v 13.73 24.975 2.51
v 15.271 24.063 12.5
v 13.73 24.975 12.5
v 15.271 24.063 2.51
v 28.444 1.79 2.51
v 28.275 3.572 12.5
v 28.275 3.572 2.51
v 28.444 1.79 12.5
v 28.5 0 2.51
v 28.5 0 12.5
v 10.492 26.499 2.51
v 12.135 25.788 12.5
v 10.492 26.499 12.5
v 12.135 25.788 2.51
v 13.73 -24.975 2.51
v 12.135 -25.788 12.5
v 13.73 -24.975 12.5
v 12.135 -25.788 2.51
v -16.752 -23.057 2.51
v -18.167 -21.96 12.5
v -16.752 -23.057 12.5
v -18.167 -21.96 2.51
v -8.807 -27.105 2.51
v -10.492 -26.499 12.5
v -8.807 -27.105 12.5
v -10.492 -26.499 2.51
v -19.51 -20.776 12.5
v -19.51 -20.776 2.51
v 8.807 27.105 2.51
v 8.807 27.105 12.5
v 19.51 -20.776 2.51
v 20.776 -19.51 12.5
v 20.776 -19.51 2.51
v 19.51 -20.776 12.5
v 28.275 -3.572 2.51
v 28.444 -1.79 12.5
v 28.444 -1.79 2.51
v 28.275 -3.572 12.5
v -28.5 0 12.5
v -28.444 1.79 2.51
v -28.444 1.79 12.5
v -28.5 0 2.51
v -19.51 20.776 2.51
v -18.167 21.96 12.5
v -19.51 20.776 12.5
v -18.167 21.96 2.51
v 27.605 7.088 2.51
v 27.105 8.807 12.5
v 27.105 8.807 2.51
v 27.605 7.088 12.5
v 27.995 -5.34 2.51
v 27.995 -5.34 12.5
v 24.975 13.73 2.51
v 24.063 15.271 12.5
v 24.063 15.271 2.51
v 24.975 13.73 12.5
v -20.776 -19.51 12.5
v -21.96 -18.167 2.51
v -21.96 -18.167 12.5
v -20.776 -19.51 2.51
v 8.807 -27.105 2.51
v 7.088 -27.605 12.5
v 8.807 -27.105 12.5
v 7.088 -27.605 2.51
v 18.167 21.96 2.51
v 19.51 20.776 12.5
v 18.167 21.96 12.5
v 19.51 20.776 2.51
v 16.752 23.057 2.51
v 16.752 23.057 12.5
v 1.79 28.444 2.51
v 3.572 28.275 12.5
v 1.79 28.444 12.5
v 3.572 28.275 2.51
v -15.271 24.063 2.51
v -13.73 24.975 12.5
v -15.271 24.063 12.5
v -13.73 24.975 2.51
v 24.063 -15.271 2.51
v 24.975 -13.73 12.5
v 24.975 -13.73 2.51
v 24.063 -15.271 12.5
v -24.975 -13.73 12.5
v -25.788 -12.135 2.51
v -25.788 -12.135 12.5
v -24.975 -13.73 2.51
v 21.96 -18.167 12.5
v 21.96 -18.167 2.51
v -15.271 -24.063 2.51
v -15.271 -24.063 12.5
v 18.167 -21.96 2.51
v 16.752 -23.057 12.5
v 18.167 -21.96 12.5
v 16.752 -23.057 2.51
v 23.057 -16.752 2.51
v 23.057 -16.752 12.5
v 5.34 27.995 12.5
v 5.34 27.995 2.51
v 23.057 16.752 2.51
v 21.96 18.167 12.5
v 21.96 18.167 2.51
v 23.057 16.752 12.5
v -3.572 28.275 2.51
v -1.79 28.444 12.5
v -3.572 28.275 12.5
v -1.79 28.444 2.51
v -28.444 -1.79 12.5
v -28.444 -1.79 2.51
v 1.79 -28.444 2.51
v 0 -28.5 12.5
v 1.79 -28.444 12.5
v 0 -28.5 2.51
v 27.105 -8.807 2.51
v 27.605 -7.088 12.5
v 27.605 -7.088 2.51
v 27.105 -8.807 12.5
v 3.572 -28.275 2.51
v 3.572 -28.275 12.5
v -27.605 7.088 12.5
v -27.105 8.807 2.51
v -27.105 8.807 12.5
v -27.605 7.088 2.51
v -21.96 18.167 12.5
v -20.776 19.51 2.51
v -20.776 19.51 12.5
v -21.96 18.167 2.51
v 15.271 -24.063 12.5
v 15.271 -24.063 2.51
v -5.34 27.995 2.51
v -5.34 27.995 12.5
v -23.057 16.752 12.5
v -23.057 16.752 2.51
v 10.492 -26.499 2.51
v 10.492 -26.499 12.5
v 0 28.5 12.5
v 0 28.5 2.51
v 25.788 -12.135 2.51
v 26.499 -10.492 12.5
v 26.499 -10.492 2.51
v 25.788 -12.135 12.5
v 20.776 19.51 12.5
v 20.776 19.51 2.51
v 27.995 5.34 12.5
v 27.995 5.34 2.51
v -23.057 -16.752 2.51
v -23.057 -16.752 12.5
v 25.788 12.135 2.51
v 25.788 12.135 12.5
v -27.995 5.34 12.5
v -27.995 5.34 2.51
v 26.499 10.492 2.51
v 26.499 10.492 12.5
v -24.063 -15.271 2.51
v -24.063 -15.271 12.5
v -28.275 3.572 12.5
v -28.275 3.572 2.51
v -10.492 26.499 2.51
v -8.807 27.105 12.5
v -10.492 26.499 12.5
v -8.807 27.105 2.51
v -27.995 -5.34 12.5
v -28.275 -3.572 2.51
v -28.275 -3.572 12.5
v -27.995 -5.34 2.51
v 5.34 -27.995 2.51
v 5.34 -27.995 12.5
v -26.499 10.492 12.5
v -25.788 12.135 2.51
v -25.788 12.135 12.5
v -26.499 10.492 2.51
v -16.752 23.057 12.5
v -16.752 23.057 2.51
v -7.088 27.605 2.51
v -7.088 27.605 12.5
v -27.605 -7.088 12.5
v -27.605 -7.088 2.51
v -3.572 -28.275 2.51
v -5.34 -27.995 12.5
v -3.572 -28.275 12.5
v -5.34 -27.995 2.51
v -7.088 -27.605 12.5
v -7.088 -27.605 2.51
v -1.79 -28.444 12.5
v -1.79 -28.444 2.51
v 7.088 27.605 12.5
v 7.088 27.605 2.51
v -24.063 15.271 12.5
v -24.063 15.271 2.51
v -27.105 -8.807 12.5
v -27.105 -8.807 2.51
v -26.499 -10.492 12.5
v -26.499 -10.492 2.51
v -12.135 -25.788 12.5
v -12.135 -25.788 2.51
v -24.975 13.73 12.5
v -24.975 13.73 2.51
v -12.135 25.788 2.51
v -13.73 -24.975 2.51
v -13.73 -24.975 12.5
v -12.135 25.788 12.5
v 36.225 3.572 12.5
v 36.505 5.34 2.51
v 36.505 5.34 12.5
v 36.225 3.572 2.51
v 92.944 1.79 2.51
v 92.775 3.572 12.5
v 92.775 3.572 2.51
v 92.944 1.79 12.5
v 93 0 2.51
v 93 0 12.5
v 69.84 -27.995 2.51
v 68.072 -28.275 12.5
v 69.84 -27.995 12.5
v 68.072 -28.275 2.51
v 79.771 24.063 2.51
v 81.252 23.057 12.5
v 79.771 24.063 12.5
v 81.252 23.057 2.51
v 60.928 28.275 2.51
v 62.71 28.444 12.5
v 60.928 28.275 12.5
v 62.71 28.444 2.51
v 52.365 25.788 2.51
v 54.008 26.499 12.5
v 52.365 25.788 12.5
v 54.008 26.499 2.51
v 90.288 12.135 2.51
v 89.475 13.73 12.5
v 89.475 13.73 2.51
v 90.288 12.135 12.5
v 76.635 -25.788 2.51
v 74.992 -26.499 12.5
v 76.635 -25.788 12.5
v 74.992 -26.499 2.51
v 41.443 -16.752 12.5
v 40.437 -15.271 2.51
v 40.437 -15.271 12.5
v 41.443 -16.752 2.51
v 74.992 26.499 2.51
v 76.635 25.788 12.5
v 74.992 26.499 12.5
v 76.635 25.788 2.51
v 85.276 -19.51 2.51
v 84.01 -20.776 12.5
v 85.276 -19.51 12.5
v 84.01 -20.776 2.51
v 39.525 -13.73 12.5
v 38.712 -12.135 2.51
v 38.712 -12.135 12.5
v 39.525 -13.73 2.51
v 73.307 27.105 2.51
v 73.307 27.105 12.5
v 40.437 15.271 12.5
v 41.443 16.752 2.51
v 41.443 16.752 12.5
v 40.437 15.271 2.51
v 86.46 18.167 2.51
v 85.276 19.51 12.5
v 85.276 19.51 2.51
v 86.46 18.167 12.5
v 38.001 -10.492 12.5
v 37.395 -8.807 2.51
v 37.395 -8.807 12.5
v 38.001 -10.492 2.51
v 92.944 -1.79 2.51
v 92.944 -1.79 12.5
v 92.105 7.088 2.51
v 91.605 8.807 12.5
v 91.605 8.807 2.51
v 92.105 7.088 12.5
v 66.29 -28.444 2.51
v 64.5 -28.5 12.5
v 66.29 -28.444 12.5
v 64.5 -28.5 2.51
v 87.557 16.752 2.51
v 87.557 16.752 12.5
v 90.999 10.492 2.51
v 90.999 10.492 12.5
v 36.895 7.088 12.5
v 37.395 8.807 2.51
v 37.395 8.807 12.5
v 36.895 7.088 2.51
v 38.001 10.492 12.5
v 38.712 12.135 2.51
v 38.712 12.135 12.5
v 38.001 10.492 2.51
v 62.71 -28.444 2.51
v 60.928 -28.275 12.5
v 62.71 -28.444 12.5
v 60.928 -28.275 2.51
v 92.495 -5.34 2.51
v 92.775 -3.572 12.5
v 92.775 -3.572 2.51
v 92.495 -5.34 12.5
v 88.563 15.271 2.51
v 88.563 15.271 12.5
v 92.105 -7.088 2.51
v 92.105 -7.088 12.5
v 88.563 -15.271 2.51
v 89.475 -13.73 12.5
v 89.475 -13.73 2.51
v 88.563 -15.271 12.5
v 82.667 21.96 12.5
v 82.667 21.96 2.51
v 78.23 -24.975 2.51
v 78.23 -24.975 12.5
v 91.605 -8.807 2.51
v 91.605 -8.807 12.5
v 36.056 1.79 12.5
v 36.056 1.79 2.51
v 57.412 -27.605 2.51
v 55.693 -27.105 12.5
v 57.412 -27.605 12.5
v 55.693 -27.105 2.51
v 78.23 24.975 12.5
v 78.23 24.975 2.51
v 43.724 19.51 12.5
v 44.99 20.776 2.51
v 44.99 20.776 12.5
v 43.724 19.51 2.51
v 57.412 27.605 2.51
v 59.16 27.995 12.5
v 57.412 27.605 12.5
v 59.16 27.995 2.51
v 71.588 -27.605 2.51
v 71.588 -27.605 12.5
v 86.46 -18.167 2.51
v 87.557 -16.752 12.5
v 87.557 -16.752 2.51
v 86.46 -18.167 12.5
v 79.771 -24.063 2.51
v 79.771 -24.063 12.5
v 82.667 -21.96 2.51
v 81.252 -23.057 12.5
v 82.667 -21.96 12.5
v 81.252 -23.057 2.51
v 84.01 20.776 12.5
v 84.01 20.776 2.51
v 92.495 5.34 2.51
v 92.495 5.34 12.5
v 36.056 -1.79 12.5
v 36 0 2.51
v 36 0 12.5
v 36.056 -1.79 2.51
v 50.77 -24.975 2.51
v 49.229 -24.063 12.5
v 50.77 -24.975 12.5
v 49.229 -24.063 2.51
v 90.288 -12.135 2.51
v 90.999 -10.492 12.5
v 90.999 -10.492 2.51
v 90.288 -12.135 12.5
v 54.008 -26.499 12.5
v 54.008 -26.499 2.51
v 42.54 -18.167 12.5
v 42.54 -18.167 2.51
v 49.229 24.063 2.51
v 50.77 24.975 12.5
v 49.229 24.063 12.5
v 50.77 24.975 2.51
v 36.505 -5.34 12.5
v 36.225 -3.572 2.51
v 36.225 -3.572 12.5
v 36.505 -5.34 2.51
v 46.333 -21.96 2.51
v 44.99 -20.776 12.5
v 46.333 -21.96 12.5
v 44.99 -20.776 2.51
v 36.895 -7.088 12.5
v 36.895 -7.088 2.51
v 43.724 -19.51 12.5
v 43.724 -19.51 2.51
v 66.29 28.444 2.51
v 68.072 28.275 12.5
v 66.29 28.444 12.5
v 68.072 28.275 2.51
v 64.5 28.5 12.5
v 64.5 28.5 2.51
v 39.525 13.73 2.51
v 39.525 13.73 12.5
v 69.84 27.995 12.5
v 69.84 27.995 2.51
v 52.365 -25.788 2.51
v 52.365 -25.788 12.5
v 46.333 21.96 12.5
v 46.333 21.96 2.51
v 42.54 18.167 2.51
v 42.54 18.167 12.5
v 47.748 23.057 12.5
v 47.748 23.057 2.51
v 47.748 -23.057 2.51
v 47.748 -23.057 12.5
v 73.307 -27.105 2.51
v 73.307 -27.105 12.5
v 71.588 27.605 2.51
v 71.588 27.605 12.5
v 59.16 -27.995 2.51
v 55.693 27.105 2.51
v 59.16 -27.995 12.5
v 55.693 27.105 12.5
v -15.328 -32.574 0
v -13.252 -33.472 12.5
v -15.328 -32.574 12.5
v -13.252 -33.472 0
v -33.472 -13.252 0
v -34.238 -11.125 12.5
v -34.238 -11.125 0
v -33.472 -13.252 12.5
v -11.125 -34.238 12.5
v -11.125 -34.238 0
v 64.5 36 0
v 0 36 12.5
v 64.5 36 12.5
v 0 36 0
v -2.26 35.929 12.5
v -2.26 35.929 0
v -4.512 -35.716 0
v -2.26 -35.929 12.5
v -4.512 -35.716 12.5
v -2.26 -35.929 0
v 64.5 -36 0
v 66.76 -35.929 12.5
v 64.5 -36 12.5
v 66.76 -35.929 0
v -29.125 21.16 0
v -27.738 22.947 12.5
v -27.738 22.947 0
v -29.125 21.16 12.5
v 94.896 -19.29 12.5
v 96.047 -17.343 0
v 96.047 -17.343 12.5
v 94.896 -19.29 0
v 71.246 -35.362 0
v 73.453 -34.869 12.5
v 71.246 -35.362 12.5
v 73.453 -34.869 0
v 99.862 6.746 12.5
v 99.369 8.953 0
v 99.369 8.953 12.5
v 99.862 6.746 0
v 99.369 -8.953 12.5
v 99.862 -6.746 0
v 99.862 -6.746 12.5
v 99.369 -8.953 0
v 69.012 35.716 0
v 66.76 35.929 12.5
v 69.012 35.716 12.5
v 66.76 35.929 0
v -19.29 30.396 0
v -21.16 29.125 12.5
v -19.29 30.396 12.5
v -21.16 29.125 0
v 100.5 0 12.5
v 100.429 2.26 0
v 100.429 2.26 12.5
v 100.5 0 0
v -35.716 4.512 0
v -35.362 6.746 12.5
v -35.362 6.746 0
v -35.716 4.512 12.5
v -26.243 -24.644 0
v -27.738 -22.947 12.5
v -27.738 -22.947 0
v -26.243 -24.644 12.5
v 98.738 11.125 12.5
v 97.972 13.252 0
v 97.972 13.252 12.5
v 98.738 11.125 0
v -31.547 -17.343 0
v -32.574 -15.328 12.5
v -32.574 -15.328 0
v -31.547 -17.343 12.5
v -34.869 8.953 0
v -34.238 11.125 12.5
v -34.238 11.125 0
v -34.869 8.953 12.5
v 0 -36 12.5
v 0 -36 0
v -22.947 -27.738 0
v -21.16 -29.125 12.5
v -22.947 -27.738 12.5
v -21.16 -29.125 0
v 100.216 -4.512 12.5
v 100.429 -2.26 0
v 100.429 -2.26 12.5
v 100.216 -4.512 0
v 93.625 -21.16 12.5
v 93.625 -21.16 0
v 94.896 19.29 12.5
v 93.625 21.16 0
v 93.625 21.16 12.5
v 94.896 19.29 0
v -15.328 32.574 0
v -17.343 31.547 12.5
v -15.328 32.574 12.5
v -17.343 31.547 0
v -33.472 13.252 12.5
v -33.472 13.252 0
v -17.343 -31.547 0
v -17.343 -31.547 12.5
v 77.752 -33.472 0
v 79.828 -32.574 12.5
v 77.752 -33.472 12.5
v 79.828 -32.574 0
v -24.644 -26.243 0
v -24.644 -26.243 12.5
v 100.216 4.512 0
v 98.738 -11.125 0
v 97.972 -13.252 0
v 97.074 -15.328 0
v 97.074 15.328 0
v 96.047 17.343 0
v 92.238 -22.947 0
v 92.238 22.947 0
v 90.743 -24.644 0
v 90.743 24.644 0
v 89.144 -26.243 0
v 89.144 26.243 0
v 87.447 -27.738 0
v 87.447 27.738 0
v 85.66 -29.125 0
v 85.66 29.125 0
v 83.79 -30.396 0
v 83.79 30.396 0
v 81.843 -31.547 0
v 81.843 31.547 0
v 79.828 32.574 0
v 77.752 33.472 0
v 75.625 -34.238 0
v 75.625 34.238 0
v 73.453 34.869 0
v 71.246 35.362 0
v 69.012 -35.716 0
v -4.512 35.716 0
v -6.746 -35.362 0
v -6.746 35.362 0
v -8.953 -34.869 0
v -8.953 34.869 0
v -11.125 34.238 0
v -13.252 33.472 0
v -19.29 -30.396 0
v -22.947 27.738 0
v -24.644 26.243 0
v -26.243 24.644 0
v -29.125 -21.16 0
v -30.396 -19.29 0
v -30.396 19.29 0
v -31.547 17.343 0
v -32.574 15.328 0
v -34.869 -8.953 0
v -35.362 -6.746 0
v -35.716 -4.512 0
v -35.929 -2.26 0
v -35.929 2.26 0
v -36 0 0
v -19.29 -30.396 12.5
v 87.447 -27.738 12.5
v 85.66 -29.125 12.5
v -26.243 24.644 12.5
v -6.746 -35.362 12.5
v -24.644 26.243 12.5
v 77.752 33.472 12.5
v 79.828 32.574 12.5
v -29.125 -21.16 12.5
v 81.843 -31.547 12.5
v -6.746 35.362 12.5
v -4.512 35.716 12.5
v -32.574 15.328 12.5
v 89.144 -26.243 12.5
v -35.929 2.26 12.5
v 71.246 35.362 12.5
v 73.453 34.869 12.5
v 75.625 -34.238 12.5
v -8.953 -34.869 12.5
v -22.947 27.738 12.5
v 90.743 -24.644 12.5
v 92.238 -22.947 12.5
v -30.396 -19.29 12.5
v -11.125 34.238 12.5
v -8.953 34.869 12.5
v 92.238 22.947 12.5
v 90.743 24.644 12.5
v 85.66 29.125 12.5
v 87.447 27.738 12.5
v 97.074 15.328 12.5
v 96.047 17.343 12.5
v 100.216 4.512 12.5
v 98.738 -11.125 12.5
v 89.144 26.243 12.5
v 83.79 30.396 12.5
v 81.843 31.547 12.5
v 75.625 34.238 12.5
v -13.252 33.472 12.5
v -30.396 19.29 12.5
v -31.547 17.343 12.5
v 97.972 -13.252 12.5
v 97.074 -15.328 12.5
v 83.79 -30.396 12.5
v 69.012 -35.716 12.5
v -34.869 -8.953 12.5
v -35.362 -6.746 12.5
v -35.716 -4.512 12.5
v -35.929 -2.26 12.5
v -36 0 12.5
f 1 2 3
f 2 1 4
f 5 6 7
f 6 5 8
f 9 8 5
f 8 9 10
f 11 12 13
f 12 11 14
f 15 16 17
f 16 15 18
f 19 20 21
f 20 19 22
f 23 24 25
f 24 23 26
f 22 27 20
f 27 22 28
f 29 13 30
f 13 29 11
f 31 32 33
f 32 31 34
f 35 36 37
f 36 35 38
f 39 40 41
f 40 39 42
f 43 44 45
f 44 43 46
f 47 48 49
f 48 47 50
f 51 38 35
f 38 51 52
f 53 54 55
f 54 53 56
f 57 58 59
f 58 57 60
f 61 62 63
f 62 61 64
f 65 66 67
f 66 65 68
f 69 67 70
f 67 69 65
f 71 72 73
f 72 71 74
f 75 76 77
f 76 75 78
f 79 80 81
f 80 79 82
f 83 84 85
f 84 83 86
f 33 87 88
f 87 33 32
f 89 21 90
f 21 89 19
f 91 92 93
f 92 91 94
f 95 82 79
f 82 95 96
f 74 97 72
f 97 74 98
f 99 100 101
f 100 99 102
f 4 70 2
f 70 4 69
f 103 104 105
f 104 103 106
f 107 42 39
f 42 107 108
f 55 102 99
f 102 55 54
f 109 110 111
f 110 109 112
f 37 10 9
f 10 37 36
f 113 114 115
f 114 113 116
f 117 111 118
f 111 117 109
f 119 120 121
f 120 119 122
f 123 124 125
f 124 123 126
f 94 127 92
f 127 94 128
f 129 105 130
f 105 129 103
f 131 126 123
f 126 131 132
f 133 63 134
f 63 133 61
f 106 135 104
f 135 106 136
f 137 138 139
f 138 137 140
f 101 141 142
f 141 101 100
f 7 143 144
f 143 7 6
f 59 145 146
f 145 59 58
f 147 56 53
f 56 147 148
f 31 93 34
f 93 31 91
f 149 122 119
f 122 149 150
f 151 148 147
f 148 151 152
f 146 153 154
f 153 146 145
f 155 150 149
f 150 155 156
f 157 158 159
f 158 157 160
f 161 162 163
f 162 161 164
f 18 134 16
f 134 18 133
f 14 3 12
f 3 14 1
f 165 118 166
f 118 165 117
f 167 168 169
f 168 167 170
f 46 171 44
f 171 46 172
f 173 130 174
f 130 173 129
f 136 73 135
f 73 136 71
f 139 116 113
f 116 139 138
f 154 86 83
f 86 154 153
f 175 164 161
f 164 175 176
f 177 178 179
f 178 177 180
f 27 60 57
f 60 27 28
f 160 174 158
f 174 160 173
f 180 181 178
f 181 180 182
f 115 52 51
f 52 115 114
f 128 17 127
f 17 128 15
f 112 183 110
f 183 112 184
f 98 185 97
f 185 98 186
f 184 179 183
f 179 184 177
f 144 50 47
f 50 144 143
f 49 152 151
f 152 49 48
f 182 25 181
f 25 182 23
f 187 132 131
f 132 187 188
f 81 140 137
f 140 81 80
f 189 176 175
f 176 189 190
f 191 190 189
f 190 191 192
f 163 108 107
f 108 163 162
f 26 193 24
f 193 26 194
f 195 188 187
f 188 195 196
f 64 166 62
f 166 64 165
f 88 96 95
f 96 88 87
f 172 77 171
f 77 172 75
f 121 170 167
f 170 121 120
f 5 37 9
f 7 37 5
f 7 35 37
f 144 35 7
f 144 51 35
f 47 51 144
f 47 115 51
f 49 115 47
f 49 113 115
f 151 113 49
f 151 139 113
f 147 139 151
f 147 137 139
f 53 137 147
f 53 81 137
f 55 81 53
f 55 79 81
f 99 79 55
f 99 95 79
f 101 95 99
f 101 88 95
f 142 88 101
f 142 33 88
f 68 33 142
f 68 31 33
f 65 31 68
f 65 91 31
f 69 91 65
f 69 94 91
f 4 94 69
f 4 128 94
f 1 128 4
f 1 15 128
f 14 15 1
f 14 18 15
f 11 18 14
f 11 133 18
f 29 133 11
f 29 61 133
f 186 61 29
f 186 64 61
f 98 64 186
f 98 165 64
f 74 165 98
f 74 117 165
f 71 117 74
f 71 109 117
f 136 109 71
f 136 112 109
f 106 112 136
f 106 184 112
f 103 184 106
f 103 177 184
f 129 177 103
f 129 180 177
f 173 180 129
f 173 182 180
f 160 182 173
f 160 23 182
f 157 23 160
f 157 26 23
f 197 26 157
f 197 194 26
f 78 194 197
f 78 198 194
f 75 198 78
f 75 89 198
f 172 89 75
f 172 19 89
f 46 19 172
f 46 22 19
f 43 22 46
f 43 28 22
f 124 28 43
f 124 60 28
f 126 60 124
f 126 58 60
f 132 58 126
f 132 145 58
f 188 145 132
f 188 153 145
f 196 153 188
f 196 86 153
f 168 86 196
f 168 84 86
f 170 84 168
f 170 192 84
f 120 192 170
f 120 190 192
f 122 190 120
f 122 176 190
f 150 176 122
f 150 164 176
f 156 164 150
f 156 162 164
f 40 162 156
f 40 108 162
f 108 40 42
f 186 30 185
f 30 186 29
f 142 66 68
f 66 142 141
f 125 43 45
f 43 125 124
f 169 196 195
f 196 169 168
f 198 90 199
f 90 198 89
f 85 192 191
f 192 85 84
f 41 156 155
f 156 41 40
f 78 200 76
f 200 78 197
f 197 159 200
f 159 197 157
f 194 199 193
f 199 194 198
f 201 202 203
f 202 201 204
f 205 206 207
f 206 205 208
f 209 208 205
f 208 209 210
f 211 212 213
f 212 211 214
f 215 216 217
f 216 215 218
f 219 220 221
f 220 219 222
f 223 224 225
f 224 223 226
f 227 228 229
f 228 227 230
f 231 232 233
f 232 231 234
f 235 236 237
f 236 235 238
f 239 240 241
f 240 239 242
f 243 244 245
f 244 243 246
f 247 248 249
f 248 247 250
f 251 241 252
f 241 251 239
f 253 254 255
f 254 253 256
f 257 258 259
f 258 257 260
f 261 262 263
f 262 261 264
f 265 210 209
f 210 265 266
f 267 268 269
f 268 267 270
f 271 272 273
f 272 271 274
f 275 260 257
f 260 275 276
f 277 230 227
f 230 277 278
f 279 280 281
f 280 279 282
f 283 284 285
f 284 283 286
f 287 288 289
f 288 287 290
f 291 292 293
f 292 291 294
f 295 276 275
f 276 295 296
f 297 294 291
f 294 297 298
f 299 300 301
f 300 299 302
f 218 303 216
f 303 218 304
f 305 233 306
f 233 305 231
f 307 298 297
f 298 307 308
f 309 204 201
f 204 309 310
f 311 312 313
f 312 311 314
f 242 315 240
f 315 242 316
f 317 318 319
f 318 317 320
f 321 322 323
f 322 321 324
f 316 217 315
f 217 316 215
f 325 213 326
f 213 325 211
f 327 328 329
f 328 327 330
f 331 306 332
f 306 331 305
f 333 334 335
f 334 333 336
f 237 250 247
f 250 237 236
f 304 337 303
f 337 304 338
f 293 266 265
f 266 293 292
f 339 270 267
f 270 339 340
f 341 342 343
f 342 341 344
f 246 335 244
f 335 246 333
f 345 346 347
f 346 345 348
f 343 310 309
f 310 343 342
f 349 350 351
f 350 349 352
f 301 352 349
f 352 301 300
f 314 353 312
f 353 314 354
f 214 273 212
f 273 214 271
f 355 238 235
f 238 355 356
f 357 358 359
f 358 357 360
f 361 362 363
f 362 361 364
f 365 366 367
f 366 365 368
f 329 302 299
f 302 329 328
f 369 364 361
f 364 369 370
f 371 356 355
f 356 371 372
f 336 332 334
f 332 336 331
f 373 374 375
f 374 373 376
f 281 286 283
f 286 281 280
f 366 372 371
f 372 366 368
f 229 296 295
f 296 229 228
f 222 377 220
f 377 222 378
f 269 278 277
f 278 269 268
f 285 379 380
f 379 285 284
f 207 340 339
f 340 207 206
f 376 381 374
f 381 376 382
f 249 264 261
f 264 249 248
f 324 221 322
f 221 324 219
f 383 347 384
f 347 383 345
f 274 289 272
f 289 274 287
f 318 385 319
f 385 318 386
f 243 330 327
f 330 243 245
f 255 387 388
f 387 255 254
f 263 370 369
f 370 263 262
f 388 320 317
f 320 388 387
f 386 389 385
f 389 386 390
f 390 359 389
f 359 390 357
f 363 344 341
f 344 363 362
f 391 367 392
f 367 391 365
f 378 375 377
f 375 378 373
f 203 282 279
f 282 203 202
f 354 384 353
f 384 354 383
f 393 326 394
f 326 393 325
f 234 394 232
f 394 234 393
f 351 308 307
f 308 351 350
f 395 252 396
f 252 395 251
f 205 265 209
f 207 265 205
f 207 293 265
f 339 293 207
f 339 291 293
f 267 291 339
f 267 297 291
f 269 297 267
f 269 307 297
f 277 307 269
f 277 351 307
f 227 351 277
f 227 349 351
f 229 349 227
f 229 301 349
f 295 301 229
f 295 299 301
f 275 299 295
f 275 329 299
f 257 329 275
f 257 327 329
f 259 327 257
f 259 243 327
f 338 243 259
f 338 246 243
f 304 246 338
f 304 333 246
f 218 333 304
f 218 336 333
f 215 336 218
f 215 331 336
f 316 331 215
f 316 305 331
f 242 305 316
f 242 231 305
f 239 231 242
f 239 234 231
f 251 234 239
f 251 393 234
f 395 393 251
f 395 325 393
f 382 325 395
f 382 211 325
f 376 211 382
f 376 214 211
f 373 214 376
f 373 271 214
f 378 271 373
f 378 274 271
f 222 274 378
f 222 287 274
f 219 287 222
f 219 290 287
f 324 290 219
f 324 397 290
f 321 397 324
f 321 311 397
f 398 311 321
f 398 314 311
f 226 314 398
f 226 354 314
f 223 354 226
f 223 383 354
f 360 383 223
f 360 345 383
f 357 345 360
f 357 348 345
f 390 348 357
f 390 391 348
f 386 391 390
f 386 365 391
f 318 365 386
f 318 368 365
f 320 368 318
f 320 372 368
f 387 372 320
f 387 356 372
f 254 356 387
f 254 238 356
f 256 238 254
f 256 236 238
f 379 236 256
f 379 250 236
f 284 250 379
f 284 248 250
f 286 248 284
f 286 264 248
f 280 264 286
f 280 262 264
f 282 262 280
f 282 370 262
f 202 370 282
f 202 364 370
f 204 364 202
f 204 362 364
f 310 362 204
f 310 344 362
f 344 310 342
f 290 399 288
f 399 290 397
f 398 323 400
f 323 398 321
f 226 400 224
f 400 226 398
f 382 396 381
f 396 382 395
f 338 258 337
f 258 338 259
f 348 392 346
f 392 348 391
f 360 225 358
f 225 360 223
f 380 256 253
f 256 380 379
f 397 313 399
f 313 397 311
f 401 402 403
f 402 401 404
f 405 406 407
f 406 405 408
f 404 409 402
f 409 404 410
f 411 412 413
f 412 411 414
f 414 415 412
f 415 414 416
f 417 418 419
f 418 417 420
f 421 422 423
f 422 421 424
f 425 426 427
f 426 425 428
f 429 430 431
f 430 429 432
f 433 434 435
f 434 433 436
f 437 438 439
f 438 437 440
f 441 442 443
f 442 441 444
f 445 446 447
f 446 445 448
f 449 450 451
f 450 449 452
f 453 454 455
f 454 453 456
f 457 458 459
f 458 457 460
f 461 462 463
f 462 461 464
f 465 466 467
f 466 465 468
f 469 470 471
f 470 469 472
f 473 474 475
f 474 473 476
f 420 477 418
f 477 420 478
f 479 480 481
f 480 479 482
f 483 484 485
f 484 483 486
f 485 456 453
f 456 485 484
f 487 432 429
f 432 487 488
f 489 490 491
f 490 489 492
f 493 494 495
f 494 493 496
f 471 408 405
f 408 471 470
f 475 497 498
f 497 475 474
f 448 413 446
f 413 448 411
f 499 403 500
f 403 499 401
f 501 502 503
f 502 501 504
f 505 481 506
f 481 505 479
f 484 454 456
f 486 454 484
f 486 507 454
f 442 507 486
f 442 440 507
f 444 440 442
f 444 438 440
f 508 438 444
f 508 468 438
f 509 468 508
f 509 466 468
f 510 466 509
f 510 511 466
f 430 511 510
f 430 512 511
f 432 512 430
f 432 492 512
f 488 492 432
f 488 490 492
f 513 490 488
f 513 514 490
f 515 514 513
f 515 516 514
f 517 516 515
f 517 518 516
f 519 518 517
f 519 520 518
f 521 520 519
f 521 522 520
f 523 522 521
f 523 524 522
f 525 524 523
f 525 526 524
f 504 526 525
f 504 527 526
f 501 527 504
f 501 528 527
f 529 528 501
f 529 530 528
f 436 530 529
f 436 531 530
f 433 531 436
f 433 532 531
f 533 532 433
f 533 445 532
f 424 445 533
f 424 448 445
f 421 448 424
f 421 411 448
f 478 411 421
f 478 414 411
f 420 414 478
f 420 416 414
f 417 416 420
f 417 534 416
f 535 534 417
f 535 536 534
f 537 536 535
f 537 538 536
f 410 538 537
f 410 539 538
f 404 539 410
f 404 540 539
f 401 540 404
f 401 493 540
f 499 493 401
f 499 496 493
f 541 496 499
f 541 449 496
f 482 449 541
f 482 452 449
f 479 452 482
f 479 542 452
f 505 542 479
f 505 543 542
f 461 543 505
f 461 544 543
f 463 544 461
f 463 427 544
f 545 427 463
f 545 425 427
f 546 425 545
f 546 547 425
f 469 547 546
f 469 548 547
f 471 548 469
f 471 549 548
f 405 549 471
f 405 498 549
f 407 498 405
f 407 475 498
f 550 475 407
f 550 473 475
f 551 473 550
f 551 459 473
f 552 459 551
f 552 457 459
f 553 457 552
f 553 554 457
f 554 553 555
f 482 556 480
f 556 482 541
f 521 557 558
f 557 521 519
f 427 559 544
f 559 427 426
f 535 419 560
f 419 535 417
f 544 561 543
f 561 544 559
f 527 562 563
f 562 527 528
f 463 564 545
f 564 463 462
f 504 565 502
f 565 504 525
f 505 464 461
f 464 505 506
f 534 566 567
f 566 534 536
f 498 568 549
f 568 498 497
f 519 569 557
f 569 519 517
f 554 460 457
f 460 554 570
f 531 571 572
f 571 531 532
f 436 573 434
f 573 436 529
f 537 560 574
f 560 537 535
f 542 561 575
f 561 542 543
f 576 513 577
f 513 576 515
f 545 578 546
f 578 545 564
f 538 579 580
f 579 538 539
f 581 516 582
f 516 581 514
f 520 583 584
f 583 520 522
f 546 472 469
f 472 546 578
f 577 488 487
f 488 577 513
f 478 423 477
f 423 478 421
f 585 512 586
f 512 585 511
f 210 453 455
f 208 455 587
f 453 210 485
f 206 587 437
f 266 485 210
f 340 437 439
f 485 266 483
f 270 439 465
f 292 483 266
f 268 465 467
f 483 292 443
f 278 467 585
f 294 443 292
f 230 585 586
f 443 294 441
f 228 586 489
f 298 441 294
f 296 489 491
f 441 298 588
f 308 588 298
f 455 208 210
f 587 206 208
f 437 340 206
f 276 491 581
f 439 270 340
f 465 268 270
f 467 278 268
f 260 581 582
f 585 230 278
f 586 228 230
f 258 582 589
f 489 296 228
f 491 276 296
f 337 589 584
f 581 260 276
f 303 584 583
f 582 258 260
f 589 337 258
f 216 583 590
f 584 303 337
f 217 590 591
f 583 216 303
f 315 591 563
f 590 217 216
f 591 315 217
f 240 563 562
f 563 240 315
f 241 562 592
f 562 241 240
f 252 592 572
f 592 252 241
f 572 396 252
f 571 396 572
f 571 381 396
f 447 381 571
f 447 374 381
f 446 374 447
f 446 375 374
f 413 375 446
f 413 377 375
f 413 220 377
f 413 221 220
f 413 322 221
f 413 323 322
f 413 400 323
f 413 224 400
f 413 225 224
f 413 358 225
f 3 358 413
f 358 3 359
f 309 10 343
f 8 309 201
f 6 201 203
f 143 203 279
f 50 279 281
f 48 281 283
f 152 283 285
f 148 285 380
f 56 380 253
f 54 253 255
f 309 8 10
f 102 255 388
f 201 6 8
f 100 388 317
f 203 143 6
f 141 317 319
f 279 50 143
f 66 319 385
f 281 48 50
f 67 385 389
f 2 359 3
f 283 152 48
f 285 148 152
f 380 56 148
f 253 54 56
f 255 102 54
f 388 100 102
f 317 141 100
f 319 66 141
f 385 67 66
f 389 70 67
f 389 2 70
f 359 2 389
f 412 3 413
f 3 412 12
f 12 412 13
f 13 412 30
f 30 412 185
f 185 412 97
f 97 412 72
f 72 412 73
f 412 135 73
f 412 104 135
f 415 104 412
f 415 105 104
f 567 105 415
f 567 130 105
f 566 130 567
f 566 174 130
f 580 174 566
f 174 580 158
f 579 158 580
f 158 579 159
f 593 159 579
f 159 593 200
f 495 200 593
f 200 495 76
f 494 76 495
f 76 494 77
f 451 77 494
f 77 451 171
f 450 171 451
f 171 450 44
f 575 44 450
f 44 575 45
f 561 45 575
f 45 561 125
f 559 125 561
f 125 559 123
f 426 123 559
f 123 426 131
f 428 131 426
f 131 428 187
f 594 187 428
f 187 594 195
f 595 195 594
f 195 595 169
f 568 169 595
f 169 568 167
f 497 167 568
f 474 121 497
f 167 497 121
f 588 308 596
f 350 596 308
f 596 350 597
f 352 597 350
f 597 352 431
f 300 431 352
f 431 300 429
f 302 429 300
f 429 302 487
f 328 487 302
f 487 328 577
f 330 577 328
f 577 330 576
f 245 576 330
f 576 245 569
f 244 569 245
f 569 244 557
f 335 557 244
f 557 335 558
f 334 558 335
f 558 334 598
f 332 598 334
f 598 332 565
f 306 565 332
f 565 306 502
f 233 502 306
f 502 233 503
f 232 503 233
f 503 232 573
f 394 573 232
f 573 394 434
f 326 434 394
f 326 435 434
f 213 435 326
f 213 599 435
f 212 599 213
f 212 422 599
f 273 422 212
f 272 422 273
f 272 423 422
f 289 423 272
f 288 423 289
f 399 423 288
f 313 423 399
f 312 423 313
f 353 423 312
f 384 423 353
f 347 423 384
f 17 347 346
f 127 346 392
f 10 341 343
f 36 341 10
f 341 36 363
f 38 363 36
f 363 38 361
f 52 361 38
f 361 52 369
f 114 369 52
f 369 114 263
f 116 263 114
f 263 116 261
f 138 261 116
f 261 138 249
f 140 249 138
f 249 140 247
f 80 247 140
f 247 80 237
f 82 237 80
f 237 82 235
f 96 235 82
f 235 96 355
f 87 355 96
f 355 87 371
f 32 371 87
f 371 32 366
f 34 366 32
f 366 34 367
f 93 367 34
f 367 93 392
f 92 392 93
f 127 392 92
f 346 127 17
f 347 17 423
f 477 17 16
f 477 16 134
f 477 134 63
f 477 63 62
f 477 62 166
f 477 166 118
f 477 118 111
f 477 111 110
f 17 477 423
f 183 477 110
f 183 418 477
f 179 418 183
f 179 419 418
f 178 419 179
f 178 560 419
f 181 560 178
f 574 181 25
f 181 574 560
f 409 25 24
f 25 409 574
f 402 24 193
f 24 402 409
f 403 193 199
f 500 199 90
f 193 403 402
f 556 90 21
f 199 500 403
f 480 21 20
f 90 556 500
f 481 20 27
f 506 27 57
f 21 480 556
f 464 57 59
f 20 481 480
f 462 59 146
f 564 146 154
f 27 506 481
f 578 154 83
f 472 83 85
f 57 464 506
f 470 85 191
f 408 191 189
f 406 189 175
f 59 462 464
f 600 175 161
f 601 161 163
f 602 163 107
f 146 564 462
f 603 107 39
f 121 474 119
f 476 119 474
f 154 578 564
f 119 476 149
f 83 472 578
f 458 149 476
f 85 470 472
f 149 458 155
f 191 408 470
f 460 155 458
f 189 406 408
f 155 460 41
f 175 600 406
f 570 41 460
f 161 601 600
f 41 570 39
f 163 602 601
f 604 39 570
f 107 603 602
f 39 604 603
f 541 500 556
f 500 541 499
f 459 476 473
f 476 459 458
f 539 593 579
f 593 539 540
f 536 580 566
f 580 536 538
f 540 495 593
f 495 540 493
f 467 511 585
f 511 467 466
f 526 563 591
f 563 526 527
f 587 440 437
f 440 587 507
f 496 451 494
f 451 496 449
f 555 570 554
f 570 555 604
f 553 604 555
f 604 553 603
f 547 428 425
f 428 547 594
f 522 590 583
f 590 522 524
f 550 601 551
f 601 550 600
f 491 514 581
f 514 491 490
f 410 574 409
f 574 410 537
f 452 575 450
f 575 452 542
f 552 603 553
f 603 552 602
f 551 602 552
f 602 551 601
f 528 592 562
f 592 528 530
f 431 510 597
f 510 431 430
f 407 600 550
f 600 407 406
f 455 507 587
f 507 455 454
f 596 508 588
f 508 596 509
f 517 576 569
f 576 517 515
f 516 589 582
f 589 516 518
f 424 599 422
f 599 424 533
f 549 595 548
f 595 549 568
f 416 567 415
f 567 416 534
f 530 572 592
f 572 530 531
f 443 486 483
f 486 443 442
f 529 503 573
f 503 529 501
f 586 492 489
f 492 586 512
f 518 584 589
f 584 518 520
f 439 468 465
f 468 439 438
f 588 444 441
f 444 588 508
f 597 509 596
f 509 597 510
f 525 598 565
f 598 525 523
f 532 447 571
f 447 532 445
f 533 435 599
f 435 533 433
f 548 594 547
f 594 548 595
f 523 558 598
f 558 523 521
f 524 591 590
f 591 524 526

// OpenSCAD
// Peugeot Daman U'Select S&P shakers
// shaker_radius = 64.8/2;

// Peugeot OUESSANT
shaker_radius = 56.0/2;

shaker_offset=0.5;
shaker_separation=7.5;

hole_depth = 10;
plate_thickness = 2.5;

height = 1;
length = 50;
width = 10;

$fn=100;


difference() {
hull() {
cylinder(
    r=shaker_radius+shaker_offset+shaker_separation,
    h=hole_depth+plate_thickness,
    center=false
);
translate(v=[2*(shaker_radius+shaker_offset)+shaker_separation, 0, 0]) {
cylinder(
    r=shaker_radius+shaker_offset+shaker_separation,
    h=hole_depth+plate_thickness,
    center=false
);
}
}
    
    
    
translate(v=[0, 0, plate_thickness+0.01]) {
color("red") {
cylinder(
    r=shaker_radius+shaker_offset,
    h=hole_depth,
    center=false
);
}

color("blue") {
translate(v=[2*(shaker_radius+shaker_offset)+shaker_separation, 0, 0]) {
cylinder(
    r=shaker_radius+shaker_offset,
    h=hole_depth,
    center=false
);
}
}
}
}
